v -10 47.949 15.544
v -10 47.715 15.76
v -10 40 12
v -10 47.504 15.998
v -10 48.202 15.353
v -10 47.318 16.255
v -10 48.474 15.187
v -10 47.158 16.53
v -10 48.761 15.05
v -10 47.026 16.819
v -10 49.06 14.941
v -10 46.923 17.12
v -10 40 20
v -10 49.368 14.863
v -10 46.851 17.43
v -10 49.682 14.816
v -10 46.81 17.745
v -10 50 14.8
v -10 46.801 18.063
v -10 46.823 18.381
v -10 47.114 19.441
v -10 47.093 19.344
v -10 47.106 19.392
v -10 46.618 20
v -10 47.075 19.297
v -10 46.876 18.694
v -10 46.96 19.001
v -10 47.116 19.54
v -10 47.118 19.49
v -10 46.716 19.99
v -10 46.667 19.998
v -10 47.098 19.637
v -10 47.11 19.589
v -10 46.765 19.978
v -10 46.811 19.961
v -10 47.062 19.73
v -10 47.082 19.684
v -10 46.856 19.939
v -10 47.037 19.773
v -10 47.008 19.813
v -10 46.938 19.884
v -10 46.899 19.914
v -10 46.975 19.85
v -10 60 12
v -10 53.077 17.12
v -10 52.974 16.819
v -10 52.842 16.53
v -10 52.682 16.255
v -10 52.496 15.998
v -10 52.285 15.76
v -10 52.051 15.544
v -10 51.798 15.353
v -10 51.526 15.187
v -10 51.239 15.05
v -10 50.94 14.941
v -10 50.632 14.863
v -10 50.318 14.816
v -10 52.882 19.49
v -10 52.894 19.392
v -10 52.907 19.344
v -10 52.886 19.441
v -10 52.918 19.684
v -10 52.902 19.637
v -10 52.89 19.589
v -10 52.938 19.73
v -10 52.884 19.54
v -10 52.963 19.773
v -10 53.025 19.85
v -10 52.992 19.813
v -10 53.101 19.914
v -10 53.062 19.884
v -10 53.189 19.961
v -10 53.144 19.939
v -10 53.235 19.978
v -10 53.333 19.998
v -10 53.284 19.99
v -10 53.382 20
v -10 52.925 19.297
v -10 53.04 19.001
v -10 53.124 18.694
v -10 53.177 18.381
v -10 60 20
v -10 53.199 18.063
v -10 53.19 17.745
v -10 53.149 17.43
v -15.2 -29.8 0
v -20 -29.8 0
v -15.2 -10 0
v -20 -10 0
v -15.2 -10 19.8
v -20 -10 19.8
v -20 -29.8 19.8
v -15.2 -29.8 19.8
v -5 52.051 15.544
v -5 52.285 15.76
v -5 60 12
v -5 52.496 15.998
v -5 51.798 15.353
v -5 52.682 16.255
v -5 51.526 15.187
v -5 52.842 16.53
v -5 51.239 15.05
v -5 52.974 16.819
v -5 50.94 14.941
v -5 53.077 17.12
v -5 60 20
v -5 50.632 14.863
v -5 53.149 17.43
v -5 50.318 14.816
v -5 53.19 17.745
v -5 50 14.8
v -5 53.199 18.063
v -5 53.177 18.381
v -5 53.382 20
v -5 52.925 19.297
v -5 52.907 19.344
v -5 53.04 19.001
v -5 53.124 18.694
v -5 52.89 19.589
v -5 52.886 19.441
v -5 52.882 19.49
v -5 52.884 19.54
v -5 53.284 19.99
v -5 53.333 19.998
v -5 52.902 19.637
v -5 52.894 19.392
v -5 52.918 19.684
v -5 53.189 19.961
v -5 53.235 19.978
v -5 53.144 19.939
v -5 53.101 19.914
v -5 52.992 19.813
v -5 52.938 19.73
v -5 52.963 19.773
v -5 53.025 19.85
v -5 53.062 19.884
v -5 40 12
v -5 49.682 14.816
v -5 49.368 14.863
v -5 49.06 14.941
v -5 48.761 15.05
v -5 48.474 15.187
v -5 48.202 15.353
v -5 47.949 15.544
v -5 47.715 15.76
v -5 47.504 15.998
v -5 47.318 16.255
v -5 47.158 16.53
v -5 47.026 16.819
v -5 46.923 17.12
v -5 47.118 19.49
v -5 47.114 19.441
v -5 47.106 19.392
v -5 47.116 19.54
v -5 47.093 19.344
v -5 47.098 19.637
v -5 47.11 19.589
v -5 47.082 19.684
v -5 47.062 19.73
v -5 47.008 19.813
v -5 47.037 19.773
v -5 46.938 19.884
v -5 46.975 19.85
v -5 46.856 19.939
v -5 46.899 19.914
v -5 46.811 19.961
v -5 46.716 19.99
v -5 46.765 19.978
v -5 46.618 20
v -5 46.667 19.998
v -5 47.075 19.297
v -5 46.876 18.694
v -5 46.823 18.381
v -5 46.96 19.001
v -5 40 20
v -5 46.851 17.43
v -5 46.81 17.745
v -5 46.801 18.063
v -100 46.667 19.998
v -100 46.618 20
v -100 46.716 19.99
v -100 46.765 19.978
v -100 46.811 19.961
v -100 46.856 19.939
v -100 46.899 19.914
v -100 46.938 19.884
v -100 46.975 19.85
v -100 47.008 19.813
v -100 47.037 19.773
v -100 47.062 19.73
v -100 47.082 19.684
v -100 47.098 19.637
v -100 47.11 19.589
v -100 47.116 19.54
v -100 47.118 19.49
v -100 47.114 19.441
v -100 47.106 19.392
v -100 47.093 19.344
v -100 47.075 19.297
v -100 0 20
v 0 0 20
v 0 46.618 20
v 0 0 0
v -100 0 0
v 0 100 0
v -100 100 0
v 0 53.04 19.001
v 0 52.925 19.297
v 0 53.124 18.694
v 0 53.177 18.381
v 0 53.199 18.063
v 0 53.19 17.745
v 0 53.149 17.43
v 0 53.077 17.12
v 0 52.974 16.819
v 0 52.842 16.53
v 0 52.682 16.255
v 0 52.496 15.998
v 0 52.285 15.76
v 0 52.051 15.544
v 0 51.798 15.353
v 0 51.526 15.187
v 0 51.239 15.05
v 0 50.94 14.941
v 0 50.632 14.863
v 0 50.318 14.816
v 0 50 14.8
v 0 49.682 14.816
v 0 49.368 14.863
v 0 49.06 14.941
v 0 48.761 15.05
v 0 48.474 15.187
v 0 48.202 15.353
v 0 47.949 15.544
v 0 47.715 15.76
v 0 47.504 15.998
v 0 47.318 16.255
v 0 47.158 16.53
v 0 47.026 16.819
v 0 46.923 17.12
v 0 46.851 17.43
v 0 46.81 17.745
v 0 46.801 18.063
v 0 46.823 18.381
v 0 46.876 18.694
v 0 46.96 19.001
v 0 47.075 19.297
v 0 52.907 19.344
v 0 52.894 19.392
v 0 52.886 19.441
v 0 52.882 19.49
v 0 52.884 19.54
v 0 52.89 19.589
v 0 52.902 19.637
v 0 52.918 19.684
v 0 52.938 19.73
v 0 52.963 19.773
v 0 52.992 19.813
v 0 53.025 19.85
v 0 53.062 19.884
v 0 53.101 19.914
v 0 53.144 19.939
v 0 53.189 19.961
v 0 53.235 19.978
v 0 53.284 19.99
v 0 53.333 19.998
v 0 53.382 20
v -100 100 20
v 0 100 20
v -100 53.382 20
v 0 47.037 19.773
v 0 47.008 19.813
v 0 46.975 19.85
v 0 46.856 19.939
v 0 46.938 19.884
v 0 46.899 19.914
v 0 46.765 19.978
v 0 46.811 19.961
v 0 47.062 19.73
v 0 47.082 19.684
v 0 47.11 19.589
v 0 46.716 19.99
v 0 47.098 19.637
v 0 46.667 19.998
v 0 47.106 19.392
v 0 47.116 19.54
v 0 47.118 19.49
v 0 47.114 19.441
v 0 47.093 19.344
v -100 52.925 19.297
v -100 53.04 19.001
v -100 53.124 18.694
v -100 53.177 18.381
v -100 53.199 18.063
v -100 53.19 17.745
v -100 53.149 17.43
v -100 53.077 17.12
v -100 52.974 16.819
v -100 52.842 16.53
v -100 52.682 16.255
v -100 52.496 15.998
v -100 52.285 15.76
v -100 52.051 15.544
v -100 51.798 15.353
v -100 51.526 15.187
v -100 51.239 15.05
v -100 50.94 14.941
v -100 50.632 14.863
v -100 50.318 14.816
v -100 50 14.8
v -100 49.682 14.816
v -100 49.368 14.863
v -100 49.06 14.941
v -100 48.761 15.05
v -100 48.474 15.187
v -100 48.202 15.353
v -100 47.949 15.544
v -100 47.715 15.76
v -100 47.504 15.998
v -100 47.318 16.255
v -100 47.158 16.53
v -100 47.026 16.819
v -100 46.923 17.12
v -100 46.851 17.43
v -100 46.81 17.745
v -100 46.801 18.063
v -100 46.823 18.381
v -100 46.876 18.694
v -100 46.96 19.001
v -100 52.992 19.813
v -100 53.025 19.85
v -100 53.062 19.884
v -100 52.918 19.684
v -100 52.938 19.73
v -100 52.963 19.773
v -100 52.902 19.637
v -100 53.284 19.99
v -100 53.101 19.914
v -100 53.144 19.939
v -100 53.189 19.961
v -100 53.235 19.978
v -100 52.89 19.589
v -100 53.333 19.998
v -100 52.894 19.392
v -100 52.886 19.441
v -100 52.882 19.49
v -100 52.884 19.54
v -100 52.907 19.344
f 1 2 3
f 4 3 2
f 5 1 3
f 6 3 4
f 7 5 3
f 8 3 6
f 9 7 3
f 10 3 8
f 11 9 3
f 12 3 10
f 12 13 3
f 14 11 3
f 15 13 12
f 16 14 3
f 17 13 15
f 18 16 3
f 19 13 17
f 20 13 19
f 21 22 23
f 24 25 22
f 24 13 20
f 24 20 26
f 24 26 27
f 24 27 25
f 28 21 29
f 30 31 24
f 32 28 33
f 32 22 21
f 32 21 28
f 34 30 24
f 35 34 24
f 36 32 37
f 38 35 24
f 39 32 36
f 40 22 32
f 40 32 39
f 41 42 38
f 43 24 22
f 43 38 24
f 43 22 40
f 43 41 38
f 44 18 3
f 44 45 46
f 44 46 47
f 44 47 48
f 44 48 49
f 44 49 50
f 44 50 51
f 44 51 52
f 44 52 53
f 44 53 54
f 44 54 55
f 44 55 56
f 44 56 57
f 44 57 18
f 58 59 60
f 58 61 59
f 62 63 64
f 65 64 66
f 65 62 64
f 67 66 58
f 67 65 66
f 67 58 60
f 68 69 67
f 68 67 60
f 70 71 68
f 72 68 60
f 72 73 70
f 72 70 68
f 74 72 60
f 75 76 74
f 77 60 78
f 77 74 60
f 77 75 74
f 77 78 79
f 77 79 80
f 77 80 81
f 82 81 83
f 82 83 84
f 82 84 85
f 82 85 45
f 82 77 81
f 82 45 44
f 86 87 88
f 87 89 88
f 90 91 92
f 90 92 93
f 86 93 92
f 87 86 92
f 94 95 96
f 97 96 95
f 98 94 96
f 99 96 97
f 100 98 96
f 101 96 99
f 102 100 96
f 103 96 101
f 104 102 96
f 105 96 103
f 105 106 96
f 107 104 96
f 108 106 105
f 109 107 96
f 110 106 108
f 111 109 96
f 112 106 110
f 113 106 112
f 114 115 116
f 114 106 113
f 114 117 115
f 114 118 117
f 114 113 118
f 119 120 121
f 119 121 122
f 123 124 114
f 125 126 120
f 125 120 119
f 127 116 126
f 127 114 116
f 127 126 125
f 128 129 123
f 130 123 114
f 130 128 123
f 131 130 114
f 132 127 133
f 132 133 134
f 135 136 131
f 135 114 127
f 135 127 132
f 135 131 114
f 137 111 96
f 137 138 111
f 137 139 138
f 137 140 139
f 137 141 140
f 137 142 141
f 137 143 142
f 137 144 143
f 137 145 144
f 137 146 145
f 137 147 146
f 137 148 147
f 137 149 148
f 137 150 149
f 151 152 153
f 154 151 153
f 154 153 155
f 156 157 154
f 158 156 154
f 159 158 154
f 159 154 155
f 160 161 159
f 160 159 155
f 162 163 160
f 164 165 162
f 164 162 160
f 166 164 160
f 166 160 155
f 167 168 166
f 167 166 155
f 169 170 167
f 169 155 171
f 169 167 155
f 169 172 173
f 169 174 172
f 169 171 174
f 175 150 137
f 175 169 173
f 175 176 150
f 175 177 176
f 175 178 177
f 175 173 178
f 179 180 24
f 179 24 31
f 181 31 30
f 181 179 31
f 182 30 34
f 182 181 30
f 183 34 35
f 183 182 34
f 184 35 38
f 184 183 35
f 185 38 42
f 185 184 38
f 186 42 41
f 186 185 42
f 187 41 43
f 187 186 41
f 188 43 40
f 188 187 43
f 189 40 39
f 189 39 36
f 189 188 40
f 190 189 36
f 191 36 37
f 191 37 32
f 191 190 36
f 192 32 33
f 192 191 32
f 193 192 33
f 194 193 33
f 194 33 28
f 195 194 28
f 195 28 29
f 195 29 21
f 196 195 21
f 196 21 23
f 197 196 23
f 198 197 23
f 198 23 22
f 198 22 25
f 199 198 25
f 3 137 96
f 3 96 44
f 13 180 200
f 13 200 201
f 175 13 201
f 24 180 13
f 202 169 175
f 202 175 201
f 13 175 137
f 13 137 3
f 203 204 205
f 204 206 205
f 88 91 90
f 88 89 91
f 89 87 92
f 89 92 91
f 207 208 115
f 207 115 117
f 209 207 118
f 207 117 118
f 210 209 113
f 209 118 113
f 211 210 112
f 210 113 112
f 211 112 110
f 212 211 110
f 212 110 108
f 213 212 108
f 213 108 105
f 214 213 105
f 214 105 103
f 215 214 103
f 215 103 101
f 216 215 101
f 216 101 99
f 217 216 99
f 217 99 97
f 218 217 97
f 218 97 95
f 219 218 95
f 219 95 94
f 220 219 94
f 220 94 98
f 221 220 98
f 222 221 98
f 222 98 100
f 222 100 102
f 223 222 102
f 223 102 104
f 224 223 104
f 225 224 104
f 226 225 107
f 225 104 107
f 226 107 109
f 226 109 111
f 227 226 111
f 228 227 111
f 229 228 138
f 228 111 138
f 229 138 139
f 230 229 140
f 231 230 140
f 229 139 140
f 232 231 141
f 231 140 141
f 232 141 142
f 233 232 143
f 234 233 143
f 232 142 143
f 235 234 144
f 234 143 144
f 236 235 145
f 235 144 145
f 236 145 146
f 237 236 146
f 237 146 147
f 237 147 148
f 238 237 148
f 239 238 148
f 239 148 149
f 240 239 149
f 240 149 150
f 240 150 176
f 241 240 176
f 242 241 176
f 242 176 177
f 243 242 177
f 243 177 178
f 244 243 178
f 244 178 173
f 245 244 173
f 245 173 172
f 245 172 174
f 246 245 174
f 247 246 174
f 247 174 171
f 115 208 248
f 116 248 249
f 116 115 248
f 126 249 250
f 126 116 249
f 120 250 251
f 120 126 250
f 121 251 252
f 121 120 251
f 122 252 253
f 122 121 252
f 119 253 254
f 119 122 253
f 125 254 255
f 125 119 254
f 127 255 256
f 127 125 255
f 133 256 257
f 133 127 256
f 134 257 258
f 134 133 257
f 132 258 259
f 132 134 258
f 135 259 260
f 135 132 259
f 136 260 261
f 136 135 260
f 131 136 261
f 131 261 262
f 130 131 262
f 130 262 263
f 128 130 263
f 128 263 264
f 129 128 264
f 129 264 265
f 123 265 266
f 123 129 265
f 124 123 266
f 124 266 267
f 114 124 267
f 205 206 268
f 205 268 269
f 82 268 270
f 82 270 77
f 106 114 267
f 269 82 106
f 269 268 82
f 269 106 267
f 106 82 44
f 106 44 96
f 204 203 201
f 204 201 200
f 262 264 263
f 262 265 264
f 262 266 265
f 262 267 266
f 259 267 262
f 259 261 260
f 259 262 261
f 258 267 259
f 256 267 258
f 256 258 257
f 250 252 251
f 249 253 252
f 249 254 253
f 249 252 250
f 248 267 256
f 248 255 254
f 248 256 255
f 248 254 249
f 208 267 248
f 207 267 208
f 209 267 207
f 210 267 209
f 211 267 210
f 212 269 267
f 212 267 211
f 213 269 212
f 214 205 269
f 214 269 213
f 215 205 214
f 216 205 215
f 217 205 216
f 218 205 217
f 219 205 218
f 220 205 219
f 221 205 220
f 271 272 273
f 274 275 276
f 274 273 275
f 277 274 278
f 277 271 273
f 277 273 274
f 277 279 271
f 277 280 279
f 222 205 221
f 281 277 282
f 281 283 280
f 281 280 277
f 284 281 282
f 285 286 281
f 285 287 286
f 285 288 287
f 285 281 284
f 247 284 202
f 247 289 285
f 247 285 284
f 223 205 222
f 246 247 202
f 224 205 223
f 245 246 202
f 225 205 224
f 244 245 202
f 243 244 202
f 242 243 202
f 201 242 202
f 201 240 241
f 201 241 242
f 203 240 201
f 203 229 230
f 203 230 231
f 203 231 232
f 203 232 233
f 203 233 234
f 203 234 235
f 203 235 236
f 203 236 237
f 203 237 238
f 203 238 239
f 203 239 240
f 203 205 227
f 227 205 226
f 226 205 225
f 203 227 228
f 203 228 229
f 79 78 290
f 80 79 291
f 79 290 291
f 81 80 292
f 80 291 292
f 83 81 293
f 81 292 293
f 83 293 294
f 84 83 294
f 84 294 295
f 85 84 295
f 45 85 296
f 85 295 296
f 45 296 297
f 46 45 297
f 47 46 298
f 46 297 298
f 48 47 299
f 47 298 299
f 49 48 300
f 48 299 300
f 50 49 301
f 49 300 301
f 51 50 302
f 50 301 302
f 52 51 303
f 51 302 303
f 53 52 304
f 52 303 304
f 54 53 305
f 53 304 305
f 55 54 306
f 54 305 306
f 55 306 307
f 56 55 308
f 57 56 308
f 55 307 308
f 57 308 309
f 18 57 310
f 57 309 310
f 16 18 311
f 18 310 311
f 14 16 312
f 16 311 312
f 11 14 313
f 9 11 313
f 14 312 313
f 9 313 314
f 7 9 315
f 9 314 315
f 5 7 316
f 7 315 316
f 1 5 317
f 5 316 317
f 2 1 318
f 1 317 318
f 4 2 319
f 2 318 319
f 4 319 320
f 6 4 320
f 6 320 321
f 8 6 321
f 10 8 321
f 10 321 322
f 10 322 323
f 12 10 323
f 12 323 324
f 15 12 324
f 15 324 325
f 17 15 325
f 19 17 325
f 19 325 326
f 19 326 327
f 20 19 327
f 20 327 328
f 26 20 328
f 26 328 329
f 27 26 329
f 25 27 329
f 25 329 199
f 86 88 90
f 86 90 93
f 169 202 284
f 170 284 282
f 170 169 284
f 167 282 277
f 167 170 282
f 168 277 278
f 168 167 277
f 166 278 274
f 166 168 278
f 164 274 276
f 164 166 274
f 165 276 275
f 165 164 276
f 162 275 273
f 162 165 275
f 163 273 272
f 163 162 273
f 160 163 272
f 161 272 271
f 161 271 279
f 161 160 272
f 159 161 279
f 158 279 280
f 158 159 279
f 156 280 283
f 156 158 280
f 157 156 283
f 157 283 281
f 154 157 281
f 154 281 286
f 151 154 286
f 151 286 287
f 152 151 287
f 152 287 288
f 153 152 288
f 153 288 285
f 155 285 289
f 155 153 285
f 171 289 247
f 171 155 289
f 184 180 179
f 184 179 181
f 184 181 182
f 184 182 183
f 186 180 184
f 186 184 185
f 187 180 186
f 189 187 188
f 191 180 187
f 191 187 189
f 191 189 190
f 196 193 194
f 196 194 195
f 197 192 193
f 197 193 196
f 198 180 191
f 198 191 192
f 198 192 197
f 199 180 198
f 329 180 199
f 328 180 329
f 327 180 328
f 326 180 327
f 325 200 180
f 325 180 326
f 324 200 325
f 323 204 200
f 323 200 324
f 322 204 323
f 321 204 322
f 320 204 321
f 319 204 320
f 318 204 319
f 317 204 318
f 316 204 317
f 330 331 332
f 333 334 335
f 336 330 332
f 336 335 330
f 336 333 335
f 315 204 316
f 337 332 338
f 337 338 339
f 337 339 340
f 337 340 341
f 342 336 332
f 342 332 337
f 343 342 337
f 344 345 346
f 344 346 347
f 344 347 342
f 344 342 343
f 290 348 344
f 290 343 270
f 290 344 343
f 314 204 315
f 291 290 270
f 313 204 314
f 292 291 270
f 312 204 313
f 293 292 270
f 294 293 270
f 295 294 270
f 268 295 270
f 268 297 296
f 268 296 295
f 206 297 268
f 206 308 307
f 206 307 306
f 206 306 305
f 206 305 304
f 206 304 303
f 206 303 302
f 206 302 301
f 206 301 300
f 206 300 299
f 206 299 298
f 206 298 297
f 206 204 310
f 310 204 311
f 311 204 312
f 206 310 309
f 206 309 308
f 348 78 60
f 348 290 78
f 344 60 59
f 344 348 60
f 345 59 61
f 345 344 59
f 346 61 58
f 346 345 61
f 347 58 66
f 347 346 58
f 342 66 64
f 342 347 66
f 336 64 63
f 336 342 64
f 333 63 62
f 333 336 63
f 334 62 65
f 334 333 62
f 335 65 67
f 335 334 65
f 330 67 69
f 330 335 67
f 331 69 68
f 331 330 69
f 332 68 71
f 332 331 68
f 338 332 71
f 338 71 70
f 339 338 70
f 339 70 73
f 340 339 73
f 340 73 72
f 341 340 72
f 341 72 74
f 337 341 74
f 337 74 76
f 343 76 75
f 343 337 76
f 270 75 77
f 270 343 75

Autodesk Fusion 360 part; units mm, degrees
sketch "Sketch1" plane through (0, 0, 0) normal (0, 0, 1) x (1, 0, 0)
  line L0 (0, 0) -> (-100, 0)
  line L1 (-100, 0) -> (-100, 100)
  line L2 (-100, 100) -> (0, 100)
  line L3 (0, 100) -> (0, 0)
  line L4 (-20, -10) -> (-15.2, -10)
  line L5 (-15.2, -10) -> (-15.2, -29.8)
  line L6 (-15.2, -29.8) -> (-20, -29.8)
  line L7 (-20, -29.8) -> (-20, -10)
  dimension "d11" = 4.8
  dimension "d12" = 19.8
extrude "Extrude1" add sketch "Sketch1" along normal blind 20 contours L0 L1 L2 L3 makes body 1
sketch "Sketch2" plane through (-100, 0, 0) normal (-1, 0, 0) x (0, -1, 0)
  line L0 (-100, 0) -> (0, 0)
  line L1 (0, 0) -> (0, 20)
  line L2 (0, 20) -> (-100, 20)
  line L3 (-100, 20) -> (-100, 0)
  circle A0 centre (-50, 18) radius 3.2
  line L4 (-50, 18) -> (-53.2, 18)
  line L5 (-50, 18) -> (-46.8, 18)
  line L6 (-53.2, 18) -> (-46.8, 18)
  line L7 (-46.8, 18) -> (-46.8, 20)
  line L8 (-46.8, 20) -> (-53.2, 20)
  line L9 (-53.2, 20) -> (-53.2, 18)
  dimension "d3" = 6.4
extrude "Extrude2" cut sketch "Sketch2" against normal blind 115 contours L2 A0 L8 | L2 A0 L4 L5 L6 L8 | A0 L4 L5 L6 bodies 1
fillet "Fillet1" radius 0.5 2 edges at (-50, 52.498, 20) (-50, 47.502, 20) on bodies 1
sketch "Sketch3" plane through (0, 0, 20) normal (0, 0, 1) x (-1, 0, 0)
  line L0 (100, -53.3823) -> (0, -53.3823)
  line L1 (0, -53.3823) -> (0, -100)
  line L2 (0, -100) -> (100, -100)
  line L3 (100, -100) -> (100, -53.3823)
  line L4 (10, -60) -> (5, -60)
  line L5 (5, -60) -> (5, -40)
  line L6 (5, -40) -> (10, -40)
  line L7 (10, -40) -> (10, -60)
extrude "Extrude3" cut sketch "Sketch3" against normal blind 8 contours L0 L4 L5 L7 | L0 L5 L6 L7 bodies 1
extrude "Extrude4" add sketch "Sketch1" along normal blind 19.8 separate body contours L4 L5 L6 L7 makes body 2
sketch "Sketch4" plane through (0, 0, 20) normal (0, 0, 1) x (-1, 0, 0)
  line L0 (5, -60) -> (5, -53.3823)
  line L1 (5, -53.3823) -> (0, -53.3823)
  line L2 (0, -53.3823) -> (0, -100)
  line L3 (0, -100) -> (100, -100)
  line L4 (100, -100) -> (100, -53.3823)
  line L5 (100, -53.3823) -> (10, -53.3823)
  line L6 (10, -53.3823) -> (10, -60)
  line L7 (10, -60) -> (5, -60)
  line L8 (22, -60) -> (22, -40)
  line L9 (25, -40) -> (25, -60)
  line L10 (32, -60) -> (32, -40)
  line L11 (36, -40) -> (36, -60)
  line L12 (38, -60) -> (38, -40)
  line L13 (53.5, -60) -> (53.5, -40)
  line L14 (70, -60) -> (70, -40)
  line L15 (90, -60) -> (90, -40)
  line L16 (87, -60) -> (87, -40)
  dimension "d15" = 12
  dimension "d16" = 7
  dimension "d17" = 4
  dimension "d18" = 2
  dimension "d19" = 43.5
  dimension "d20" = 60
  dimension "d21" = 80
  dimension "d22" = 77
